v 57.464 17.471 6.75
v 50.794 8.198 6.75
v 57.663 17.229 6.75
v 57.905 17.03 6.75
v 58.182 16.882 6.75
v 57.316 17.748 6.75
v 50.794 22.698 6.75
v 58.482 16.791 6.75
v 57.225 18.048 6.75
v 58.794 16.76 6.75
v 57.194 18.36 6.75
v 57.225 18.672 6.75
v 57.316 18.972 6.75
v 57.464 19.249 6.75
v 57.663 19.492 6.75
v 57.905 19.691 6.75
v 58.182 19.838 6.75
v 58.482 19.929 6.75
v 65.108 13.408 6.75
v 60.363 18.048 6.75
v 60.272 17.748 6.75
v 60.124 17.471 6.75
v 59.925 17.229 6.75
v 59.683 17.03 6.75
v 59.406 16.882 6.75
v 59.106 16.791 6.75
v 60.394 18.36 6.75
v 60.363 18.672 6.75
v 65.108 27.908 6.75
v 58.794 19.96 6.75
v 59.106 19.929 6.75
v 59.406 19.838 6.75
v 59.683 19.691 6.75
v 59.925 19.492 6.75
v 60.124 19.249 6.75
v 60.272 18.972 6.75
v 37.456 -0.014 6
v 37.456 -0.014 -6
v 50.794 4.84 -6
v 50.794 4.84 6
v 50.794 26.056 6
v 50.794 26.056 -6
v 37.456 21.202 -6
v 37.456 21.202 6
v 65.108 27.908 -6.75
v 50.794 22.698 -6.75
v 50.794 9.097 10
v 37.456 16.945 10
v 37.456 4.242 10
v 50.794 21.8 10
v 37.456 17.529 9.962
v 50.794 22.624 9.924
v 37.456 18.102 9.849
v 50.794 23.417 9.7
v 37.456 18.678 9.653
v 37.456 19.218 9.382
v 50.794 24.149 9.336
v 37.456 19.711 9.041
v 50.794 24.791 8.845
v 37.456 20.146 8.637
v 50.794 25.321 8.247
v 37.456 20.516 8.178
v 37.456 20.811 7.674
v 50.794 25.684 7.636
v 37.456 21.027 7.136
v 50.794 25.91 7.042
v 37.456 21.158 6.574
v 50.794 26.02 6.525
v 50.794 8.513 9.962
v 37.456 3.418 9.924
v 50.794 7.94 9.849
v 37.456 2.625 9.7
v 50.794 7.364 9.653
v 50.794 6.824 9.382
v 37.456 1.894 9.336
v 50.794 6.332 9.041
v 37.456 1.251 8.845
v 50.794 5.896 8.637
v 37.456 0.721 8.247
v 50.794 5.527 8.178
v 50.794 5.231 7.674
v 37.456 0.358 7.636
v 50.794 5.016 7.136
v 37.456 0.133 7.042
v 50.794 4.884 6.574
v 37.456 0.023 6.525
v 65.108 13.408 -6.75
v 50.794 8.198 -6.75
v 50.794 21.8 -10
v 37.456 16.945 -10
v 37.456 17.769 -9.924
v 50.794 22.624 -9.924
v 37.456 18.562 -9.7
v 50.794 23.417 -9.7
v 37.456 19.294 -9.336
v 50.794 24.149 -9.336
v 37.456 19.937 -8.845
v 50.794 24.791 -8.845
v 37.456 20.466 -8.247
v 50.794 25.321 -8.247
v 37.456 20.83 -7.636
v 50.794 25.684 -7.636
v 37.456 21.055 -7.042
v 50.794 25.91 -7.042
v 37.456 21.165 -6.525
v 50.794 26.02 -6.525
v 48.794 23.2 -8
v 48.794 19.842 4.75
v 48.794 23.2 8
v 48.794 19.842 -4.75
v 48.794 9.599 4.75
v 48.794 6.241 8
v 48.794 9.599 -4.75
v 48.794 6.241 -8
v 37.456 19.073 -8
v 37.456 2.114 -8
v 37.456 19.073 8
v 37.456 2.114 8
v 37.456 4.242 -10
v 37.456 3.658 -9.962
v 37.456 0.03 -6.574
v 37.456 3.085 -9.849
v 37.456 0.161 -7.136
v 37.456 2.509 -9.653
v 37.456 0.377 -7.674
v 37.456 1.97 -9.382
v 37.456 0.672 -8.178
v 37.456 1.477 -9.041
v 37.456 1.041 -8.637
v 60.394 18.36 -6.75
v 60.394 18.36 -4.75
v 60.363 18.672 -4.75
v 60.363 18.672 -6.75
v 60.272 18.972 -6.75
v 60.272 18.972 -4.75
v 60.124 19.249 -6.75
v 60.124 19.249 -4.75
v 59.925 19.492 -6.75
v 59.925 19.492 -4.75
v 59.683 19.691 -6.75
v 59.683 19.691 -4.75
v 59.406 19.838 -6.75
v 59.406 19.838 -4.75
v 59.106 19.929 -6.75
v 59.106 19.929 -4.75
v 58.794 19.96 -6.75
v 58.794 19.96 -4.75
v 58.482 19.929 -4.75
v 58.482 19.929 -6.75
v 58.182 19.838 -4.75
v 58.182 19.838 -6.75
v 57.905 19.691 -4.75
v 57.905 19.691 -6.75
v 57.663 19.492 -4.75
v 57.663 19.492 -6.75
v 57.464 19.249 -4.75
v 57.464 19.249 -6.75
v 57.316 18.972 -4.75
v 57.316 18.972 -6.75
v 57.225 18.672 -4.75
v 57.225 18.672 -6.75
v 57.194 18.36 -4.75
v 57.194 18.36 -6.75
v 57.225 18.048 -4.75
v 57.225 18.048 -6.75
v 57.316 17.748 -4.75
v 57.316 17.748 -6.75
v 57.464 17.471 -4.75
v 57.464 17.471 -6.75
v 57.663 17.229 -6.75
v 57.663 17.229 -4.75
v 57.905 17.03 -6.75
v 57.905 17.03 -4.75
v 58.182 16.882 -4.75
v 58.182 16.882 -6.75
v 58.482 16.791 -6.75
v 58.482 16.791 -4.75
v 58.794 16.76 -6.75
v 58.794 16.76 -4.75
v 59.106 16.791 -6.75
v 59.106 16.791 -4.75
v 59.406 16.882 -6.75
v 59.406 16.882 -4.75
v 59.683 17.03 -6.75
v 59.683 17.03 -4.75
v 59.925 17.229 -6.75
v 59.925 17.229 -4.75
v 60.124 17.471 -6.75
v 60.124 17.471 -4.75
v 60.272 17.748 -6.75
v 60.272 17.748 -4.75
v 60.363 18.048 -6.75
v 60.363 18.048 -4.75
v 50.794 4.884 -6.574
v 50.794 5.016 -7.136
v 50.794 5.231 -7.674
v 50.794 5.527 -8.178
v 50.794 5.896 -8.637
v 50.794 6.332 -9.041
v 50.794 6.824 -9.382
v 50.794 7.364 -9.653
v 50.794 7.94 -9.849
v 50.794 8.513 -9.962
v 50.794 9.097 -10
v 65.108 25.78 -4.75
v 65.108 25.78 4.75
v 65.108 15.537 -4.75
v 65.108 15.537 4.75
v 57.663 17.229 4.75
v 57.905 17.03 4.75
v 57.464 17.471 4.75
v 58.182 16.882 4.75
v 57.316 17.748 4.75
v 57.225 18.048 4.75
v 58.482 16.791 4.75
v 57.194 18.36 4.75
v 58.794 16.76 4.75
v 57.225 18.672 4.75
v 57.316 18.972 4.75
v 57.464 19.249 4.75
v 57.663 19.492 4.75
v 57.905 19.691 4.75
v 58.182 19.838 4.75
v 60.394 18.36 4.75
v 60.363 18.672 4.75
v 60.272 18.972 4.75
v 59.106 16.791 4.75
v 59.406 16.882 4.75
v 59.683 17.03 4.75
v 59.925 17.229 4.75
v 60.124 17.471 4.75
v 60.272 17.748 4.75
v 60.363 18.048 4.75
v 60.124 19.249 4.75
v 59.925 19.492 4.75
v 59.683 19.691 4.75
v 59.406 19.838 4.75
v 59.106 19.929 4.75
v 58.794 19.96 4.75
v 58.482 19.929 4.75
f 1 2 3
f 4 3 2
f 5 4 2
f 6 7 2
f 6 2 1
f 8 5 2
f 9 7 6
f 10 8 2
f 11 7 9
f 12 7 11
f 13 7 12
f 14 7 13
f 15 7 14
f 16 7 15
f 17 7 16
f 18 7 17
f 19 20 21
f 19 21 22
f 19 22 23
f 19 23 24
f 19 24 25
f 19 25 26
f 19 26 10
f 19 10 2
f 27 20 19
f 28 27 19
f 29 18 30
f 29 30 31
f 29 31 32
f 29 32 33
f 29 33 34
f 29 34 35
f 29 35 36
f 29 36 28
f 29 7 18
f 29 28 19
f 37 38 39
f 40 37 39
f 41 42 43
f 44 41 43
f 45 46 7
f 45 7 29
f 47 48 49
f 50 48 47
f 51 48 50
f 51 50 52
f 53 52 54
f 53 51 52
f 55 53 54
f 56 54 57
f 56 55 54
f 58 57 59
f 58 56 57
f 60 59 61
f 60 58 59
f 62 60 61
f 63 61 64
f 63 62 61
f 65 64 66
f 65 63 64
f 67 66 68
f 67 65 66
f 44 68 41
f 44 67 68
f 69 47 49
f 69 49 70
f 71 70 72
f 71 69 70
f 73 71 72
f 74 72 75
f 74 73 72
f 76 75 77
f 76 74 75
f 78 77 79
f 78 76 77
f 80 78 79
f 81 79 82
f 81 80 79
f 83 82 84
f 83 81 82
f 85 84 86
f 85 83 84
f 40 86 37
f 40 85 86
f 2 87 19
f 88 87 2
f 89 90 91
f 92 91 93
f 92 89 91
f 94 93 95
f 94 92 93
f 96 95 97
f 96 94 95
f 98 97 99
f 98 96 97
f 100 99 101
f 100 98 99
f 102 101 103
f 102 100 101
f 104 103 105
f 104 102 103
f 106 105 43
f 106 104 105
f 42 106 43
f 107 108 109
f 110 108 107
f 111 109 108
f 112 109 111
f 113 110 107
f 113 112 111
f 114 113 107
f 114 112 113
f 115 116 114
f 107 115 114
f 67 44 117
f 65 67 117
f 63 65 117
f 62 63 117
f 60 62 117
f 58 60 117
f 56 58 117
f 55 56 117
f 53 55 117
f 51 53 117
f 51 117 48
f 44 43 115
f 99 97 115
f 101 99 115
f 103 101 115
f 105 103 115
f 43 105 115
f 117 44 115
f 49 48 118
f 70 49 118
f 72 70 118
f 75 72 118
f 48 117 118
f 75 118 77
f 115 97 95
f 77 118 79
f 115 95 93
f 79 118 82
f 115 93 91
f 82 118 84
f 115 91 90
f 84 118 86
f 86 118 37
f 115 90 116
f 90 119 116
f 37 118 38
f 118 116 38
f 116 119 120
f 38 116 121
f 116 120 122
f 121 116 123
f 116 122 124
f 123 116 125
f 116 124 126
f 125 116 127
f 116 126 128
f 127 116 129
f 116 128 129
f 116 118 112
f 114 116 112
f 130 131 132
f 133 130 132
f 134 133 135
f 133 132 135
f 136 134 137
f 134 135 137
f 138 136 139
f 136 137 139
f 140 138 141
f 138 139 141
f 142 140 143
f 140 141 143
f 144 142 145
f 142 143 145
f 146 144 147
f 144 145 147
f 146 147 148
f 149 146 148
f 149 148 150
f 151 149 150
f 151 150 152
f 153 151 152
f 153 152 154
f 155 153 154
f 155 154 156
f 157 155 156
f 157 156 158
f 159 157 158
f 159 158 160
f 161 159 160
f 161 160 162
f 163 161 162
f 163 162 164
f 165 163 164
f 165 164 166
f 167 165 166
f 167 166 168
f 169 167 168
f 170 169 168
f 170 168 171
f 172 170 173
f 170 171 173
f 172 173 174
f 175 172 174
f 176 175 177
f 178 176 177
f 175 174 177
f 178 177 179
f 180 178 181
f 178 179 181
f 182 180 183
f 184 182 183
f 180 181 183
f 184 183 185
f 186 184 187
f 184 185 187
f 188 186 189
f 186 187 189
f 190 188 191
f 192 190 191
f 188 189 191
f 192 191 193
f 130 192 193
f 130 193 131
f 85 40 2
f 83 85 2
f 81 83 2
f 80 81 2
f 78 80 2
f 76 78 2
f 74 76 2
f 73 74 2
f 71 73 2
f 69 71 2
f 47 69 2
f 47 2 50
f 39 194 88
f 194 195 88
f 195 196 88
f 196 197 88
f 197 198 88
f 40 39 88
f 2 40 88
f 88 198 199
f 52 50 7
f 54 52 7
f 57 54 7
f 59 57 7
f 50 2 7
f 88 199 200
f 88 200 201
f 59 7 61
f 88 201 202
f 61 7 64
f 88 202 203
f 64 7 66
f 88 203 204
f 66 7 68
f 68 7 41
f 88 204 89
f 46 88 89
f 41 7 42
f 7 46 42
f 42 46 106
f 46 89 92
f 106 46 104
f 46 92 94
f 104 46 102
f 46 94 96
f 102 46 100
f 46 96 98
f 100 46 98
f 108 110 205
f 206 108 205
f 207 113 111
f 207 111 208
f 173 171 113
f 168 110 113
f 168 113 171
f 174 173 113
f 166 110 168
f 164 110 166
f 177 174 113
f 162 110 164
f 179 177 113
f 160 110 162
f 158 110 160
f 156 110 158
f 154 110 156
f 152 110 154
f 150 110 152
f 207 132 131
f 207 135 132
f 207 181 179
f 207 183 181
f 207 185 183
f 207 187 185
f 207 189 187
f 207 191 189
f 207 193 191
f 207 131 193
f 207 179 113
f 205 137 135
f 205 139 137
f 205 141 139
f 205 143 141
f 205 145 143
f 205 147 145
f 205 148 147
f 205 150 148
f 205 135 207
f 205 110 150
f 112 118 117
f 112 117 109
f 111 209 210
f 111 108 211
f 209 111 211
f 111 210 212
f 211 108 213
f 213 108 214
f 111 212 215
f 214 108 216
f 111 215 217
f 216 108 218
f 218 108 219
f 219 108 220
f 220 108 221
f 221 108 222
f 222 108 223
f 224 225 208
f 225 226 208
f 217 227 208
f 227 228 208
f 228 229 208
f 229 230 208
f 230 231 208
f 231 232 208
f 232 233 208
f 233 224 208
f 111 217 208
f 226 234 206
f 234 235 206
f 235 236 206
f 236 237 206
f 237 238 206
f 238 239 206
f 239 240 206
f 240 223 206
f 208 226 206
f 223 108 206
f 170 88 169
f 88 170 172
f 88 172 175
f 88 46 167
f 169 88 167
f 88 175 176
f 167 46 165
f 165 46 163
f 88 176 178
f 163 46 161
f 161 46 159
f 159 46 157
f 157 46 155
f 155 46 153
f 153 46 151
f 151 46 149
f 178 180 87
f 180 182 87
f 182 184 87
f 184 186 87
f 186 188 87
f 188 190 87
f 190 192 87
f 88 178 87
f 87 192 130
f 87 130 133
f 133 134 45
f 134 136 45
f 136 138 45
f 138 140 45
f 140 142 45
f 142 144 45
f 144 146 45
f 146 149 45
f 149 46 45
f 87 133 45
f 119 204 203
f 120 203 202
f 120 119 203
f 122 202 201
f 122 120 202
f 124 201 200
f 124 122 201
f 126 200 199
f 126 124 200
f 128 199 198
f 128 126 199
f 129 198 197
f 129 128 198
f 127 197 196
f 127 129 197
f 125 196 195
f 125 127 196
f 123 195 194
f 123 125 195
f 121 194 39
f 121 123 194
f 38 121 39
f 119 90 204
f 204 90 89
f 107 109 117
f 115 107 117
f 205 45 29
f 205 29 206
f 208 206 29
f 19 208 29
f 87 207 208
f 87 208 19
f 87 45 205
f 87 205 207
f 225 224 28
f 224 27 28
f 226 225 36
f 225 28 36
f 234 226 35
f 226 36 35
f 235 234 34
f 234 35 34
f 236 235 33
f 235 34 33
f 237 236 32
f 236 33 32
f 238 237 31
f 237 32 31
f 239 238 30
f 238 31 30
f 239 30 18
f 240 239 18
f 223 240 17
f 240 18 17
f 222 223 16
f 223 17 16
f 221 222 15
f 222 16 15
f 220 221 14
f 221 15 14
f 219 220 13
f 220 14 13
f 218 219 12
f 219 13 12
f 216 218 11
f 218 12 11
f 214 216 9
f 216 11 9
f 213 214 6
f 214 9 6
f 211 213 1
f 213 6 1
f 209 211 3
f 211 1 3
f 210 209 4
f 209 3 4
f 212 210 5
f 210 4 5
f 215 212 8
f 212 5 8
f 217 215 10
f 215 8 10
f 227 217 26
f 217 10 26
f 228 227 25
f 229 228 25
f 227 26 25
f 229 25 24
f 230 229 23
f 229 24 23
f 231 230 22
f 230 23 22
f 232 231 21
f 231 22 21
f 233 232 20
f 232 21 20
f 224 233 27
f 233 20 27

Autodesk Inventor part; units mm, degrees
ref_plane "YZ Plane" through (0, 0, 0) normal (1, 0, 0) x (0, 1, 0)
ref_plane "XZ Plane" through (0, 0, 0) normal (0, 1, 0) x (-1, 0, 0)
ref_plane "XY Plane" through (0, 0, 0) normal (0, 0, 1) x (1, 0, 0)
sketch "Skizze1" plane through (0, 0, 0) normal (0, 1, 0) x (-1, 0, 0)
  line L0 (20.5, -10.1) -> (-20.5, -10.1)
  line L1 (-20.5, -10.1) -> (-20.5, 10.1)
  line L2 (-20.5, 10.1) -> (20.5, 10.1)
  line L3 (20.5, 10.1) -> (20.5, -10.1)
  line L4 (0, -23.94) -> (0, 23.94) projected
  line L5 (-40.6, 0) -> (40.6, 0) projected
  line L6 (29, -17.1) -> (-29, -17.1)
  line L7 (-29, -17.1) -> (-29, 17.1)
  line L8 (-29, 17.1) -> (29, 17.1)
  line L9 (29, 17.1) -> (29, -17.1)
  point P0 (0, 0)
  dimension "d0" = 41
  dimension "d3" = 20.2
  dimension "d7" = 58
  dimension "d8" = 7
extrude "Extrusion2" add sketch "Skizze1" along normal mid plane 4 contours L3 L5 L9 L6 L4 L0 | L4 L6 L7 L5 L1 L0 | L3 L2 L4 L8 L9 L5 | L5 L7 L8 L4 L2 L1
sketch "Skizze2" plane through (0, 2, 0) normal (0, 1, 0) x (1, 0, 0)
  circle A0 centre (-24, 5) radius 1.6
  circle A1 centre (-24, -5) radius 1.6
  line L0 (-29, 17.1) -> (-29, -17.1) projected
  line L1 (40.6, 0) -> (-40.6, 0) projected
  line L2 (0, 23.94) -> (0, -23.94) projected
  circle A2 centre (24, 5) radius 1.6
  circle A3 centre (24, -5) radius 1.6
  line L3 (-20.5, -10.1) -> (-20.5, 10.1) projected
  point P0 (0, 0)
  dimension "d11" = 3.2
  dimension "d12" = 3.2
  dimension "d15" = 10
  dimension "d16" = 5
  dimension "d58" = 3.5
  dimension "d59" = 3.5
extrude "Extrusion3" cut sketch "Skizze2" against normal up to surface (4 mm away)
sketch "Skizze3" plane through (0, 2, 0) normal (0, 1, 0) x (1, 0, 0)
  line L0 (-20.5, -10.1) -> (-20.5, 10.1) projected
  line L1 (-20.5, -0.75) -> (-27.5, -0.75)
  line L2 (-27.5, -0.75) -> (-27.5, 0.75)
  line L3 (-27.5, 0.75) -> (-20.5, 0.75)
  line L4 (-20.5, 0.75) -> (-20.5, -0.75)
  line L5 (40.6, 0) -> (-40.6, 0) projected
  line L6 (0, 23.94) -> (0, -23.94) projected
  line L7 (20.5, 10.1) -> (20.5, -10.1) projected
  line L8 (20.5, 0.75) -> (27.5, 0.75)
  line L9 (27.5, 0.75) -> (27.5, -0.75)
  line L10 (27.5, -0.75) -> (20.5, -0.75)
  line L11 (20.5, -0.75) -> (20.5, 0.75)
  point P0 (0, 0)
  dimension "d19" = 7
  dimension "d20" = 1.5
  dimension "d23" = 7
extrude "Extrusion4" cut sketch "Skizze3" against normal blind 2 contours L1 L2 L5 L0 | L5 L2 L3 L0
extrude "Extrusion5" cut sketch "Skizze3" against normal blind 2 contours L9 L10 L7 L5 | L5 L7 L8 L9
sketch "Skizze4" plane through (0, 0, 0) normal (0, 0, 1) x (1, 0, 0)
  line L0 (0, 34.5995) -> (0, -8.0999) projected
  line L1 (-12.8217, 0) -> (76.93, 0) projected
  line L2 (29, 2) -> (29, -2) projected
  line L3 (29, -2) -> (32, -2)
  line L4 (32, -2) -> (32, 19.216)
  line L5 (32, 19.216) -> (29, 19.216)
  line L6 (29, 19.216) -> (29, -2)
  line L7 (32, -2) -> (50.7939, 4.8404)
  line L8 (50.7939, 4.8404) -> (50.7939, 26.0564)
  line L9 (50.7939, 26.0564) -> (32, 19.216)
  line L10 (32, 15.858) -> (48.1939, 21.7521)
  line L11 (48.0492, 7.1994) -> (32, 1.358)
  line L12 (48.1939, 21.7521) -> (65.1083, 27.9084)
  line L13 (65.1083, 27.9084) -> (65.1083, 13.4084)
  line L14 (65.1083, 13.4084) -> (48.0492, 7.1994)
  line L15 (50.7939, 15.4484) -> (37.5768, 10.6378)
  line L16 (50.7939, 15.4484) -> (64.8591, 15.4484) construction
  point P0 (0, 0)
  point P1 (50.7939, 22.6984)
  point P2 (50.7939, 8.1984)
  dimension "d26" = 3
  dimension "d27" = 21.216
  dimension "d28" = 20
  dimension "d29" = 21.216
  dimension "d30" = 20
  dimension "d38" = 110
  dimension "d42" = 18
  dimension "d44" = 110
  dimension "d48" = 14.3145
  dimension "d66" = 14.5
  dimension "d67" = 160
extrude "Extrusion6" add sketch "Skizze4" along normal mid plane 34.2 contours L2 L6 L5 L4 L1 | L1 L4 L3 L2
sketch "Skizze6" plane through (0, 0, 0) normal (0, 0, 1) x (1, 0, 0)
  point P0 (0, 0)
extrude "Extrusion7" add sketch "Skizze4" along normal mid plane 20 contours L4 L11 L14 L8 L7 L1 | L1 L7 L4 | L4 L10 L12 L8 L14 L11 | L4 L9 L8 L12 L10
extrude "Extrusion9" add sketch "Skizze4" along normal mid plane 13.5 contours L8 L12 L13 L14
shell "Wandung2" thickness 2 removed faces 1 at (65.1083, 18.2418, -2.25)
fillet "Rundung1" radius 4 4 edges at (41.3969, 22.6362, 10) (41.3969, 22.6362, -10) (41.3969, 1.4202, -10) (41.3969, 1.4202, 10)
sketch "Skizze7" plane through (-29, -2, 17.1) normal (0, 0, 1) x (1, 0, 0)
  line L0 (-12.2, 2) -> (73.2, 2) projected
  line L1 (29, 25.4592) -> (29, -4.2432) projected
  line L2 (58, 4) -> (58, 21.216) projected
  line L3 (58, 21.216) -> (29, 4)
  line L4 (8.5, 4) -> (49.5, 4) projected
  line L5 (58, 4) -> (0, 4) projected
  line L6 (58, 4) -> (58, 21.216)
  point P0 (29, 2)
extrude "Extrusion10" add sketch "Skizze7" against normal blind 2
sketch "Skizze8" plane through (-29, -2, -17.1) normal (0, 0, -1) x (-1, 0, 0)
  line L0 (-29, -4.2432) -> (-29, 25.4592) projected
  line L1 (-73.2, 2) -> (12.2, 2) projected
  line L2 (-58, 4) -> (-58, 21.216) projected
  line L3 (-58, 21.216) -> (-29, 4)
  line L4 (-8.5, 4) -> (-49.5, 4) projected
  line L5 (-58, 4) -> (0, 4) projected
  line L6 (-58, 21.216) -> (-61, 21.216) projected
  line L7 (-58, 4) -> (-58, 21.216)
  point P0 (-29, 2)
extrude "Extrusion11" add sketch "Skizze8" against normal blind 2
sketch "Skizze9" plane through (0, 0, 6.75) normal (0, 0, 1) x (1, 0, 0)
  circle A0 centre (58.7939, 18.3602) radius 1.6
  line L0 (65.1083, 13.4084) -> (65.1083, 27.9084) projected
  line L1 (65.1083, 15.5368) -> (65.1083, 25.7801) projected
  line L2 (65.1083, 20.6584) -> (53.7155, 16.5118)
  line L3 (65.1083, 20.6584) -> (77.2323, 20.6584) construction
  line L4 (50.7939, 8.1984) -> (50.7939, 22.6984) projected
  point P0 (0, 0)
  dimension "d60" = 3.2
  dimension "d62" = 160
  dimension "d63" = 8
extrude "Extrusion12" cut sketch "Skizze9" against normal up to surface (13.5 mm away)
sketch "Skizze10" plane through (0, 0, 0) normal (0, 0, 1) x (1, 0, 0)
  line L0 (-46.9108, 47.129) -> (37.4559, 47.129)
  line L1 (37.4559, 47.129) -> (37.4559, -27.201)
  line L2 (37.4559, -27.201) -> (-46.9108, -27.201)
  line L3 (-46.9108, -27.201) -> (-46.9108, 47.129)
  point P0 (0, 0)
extrude "Extrusion13" cut sketch "Skizze10" along normal mid plane 50
properties part number "_3D-Druck"
